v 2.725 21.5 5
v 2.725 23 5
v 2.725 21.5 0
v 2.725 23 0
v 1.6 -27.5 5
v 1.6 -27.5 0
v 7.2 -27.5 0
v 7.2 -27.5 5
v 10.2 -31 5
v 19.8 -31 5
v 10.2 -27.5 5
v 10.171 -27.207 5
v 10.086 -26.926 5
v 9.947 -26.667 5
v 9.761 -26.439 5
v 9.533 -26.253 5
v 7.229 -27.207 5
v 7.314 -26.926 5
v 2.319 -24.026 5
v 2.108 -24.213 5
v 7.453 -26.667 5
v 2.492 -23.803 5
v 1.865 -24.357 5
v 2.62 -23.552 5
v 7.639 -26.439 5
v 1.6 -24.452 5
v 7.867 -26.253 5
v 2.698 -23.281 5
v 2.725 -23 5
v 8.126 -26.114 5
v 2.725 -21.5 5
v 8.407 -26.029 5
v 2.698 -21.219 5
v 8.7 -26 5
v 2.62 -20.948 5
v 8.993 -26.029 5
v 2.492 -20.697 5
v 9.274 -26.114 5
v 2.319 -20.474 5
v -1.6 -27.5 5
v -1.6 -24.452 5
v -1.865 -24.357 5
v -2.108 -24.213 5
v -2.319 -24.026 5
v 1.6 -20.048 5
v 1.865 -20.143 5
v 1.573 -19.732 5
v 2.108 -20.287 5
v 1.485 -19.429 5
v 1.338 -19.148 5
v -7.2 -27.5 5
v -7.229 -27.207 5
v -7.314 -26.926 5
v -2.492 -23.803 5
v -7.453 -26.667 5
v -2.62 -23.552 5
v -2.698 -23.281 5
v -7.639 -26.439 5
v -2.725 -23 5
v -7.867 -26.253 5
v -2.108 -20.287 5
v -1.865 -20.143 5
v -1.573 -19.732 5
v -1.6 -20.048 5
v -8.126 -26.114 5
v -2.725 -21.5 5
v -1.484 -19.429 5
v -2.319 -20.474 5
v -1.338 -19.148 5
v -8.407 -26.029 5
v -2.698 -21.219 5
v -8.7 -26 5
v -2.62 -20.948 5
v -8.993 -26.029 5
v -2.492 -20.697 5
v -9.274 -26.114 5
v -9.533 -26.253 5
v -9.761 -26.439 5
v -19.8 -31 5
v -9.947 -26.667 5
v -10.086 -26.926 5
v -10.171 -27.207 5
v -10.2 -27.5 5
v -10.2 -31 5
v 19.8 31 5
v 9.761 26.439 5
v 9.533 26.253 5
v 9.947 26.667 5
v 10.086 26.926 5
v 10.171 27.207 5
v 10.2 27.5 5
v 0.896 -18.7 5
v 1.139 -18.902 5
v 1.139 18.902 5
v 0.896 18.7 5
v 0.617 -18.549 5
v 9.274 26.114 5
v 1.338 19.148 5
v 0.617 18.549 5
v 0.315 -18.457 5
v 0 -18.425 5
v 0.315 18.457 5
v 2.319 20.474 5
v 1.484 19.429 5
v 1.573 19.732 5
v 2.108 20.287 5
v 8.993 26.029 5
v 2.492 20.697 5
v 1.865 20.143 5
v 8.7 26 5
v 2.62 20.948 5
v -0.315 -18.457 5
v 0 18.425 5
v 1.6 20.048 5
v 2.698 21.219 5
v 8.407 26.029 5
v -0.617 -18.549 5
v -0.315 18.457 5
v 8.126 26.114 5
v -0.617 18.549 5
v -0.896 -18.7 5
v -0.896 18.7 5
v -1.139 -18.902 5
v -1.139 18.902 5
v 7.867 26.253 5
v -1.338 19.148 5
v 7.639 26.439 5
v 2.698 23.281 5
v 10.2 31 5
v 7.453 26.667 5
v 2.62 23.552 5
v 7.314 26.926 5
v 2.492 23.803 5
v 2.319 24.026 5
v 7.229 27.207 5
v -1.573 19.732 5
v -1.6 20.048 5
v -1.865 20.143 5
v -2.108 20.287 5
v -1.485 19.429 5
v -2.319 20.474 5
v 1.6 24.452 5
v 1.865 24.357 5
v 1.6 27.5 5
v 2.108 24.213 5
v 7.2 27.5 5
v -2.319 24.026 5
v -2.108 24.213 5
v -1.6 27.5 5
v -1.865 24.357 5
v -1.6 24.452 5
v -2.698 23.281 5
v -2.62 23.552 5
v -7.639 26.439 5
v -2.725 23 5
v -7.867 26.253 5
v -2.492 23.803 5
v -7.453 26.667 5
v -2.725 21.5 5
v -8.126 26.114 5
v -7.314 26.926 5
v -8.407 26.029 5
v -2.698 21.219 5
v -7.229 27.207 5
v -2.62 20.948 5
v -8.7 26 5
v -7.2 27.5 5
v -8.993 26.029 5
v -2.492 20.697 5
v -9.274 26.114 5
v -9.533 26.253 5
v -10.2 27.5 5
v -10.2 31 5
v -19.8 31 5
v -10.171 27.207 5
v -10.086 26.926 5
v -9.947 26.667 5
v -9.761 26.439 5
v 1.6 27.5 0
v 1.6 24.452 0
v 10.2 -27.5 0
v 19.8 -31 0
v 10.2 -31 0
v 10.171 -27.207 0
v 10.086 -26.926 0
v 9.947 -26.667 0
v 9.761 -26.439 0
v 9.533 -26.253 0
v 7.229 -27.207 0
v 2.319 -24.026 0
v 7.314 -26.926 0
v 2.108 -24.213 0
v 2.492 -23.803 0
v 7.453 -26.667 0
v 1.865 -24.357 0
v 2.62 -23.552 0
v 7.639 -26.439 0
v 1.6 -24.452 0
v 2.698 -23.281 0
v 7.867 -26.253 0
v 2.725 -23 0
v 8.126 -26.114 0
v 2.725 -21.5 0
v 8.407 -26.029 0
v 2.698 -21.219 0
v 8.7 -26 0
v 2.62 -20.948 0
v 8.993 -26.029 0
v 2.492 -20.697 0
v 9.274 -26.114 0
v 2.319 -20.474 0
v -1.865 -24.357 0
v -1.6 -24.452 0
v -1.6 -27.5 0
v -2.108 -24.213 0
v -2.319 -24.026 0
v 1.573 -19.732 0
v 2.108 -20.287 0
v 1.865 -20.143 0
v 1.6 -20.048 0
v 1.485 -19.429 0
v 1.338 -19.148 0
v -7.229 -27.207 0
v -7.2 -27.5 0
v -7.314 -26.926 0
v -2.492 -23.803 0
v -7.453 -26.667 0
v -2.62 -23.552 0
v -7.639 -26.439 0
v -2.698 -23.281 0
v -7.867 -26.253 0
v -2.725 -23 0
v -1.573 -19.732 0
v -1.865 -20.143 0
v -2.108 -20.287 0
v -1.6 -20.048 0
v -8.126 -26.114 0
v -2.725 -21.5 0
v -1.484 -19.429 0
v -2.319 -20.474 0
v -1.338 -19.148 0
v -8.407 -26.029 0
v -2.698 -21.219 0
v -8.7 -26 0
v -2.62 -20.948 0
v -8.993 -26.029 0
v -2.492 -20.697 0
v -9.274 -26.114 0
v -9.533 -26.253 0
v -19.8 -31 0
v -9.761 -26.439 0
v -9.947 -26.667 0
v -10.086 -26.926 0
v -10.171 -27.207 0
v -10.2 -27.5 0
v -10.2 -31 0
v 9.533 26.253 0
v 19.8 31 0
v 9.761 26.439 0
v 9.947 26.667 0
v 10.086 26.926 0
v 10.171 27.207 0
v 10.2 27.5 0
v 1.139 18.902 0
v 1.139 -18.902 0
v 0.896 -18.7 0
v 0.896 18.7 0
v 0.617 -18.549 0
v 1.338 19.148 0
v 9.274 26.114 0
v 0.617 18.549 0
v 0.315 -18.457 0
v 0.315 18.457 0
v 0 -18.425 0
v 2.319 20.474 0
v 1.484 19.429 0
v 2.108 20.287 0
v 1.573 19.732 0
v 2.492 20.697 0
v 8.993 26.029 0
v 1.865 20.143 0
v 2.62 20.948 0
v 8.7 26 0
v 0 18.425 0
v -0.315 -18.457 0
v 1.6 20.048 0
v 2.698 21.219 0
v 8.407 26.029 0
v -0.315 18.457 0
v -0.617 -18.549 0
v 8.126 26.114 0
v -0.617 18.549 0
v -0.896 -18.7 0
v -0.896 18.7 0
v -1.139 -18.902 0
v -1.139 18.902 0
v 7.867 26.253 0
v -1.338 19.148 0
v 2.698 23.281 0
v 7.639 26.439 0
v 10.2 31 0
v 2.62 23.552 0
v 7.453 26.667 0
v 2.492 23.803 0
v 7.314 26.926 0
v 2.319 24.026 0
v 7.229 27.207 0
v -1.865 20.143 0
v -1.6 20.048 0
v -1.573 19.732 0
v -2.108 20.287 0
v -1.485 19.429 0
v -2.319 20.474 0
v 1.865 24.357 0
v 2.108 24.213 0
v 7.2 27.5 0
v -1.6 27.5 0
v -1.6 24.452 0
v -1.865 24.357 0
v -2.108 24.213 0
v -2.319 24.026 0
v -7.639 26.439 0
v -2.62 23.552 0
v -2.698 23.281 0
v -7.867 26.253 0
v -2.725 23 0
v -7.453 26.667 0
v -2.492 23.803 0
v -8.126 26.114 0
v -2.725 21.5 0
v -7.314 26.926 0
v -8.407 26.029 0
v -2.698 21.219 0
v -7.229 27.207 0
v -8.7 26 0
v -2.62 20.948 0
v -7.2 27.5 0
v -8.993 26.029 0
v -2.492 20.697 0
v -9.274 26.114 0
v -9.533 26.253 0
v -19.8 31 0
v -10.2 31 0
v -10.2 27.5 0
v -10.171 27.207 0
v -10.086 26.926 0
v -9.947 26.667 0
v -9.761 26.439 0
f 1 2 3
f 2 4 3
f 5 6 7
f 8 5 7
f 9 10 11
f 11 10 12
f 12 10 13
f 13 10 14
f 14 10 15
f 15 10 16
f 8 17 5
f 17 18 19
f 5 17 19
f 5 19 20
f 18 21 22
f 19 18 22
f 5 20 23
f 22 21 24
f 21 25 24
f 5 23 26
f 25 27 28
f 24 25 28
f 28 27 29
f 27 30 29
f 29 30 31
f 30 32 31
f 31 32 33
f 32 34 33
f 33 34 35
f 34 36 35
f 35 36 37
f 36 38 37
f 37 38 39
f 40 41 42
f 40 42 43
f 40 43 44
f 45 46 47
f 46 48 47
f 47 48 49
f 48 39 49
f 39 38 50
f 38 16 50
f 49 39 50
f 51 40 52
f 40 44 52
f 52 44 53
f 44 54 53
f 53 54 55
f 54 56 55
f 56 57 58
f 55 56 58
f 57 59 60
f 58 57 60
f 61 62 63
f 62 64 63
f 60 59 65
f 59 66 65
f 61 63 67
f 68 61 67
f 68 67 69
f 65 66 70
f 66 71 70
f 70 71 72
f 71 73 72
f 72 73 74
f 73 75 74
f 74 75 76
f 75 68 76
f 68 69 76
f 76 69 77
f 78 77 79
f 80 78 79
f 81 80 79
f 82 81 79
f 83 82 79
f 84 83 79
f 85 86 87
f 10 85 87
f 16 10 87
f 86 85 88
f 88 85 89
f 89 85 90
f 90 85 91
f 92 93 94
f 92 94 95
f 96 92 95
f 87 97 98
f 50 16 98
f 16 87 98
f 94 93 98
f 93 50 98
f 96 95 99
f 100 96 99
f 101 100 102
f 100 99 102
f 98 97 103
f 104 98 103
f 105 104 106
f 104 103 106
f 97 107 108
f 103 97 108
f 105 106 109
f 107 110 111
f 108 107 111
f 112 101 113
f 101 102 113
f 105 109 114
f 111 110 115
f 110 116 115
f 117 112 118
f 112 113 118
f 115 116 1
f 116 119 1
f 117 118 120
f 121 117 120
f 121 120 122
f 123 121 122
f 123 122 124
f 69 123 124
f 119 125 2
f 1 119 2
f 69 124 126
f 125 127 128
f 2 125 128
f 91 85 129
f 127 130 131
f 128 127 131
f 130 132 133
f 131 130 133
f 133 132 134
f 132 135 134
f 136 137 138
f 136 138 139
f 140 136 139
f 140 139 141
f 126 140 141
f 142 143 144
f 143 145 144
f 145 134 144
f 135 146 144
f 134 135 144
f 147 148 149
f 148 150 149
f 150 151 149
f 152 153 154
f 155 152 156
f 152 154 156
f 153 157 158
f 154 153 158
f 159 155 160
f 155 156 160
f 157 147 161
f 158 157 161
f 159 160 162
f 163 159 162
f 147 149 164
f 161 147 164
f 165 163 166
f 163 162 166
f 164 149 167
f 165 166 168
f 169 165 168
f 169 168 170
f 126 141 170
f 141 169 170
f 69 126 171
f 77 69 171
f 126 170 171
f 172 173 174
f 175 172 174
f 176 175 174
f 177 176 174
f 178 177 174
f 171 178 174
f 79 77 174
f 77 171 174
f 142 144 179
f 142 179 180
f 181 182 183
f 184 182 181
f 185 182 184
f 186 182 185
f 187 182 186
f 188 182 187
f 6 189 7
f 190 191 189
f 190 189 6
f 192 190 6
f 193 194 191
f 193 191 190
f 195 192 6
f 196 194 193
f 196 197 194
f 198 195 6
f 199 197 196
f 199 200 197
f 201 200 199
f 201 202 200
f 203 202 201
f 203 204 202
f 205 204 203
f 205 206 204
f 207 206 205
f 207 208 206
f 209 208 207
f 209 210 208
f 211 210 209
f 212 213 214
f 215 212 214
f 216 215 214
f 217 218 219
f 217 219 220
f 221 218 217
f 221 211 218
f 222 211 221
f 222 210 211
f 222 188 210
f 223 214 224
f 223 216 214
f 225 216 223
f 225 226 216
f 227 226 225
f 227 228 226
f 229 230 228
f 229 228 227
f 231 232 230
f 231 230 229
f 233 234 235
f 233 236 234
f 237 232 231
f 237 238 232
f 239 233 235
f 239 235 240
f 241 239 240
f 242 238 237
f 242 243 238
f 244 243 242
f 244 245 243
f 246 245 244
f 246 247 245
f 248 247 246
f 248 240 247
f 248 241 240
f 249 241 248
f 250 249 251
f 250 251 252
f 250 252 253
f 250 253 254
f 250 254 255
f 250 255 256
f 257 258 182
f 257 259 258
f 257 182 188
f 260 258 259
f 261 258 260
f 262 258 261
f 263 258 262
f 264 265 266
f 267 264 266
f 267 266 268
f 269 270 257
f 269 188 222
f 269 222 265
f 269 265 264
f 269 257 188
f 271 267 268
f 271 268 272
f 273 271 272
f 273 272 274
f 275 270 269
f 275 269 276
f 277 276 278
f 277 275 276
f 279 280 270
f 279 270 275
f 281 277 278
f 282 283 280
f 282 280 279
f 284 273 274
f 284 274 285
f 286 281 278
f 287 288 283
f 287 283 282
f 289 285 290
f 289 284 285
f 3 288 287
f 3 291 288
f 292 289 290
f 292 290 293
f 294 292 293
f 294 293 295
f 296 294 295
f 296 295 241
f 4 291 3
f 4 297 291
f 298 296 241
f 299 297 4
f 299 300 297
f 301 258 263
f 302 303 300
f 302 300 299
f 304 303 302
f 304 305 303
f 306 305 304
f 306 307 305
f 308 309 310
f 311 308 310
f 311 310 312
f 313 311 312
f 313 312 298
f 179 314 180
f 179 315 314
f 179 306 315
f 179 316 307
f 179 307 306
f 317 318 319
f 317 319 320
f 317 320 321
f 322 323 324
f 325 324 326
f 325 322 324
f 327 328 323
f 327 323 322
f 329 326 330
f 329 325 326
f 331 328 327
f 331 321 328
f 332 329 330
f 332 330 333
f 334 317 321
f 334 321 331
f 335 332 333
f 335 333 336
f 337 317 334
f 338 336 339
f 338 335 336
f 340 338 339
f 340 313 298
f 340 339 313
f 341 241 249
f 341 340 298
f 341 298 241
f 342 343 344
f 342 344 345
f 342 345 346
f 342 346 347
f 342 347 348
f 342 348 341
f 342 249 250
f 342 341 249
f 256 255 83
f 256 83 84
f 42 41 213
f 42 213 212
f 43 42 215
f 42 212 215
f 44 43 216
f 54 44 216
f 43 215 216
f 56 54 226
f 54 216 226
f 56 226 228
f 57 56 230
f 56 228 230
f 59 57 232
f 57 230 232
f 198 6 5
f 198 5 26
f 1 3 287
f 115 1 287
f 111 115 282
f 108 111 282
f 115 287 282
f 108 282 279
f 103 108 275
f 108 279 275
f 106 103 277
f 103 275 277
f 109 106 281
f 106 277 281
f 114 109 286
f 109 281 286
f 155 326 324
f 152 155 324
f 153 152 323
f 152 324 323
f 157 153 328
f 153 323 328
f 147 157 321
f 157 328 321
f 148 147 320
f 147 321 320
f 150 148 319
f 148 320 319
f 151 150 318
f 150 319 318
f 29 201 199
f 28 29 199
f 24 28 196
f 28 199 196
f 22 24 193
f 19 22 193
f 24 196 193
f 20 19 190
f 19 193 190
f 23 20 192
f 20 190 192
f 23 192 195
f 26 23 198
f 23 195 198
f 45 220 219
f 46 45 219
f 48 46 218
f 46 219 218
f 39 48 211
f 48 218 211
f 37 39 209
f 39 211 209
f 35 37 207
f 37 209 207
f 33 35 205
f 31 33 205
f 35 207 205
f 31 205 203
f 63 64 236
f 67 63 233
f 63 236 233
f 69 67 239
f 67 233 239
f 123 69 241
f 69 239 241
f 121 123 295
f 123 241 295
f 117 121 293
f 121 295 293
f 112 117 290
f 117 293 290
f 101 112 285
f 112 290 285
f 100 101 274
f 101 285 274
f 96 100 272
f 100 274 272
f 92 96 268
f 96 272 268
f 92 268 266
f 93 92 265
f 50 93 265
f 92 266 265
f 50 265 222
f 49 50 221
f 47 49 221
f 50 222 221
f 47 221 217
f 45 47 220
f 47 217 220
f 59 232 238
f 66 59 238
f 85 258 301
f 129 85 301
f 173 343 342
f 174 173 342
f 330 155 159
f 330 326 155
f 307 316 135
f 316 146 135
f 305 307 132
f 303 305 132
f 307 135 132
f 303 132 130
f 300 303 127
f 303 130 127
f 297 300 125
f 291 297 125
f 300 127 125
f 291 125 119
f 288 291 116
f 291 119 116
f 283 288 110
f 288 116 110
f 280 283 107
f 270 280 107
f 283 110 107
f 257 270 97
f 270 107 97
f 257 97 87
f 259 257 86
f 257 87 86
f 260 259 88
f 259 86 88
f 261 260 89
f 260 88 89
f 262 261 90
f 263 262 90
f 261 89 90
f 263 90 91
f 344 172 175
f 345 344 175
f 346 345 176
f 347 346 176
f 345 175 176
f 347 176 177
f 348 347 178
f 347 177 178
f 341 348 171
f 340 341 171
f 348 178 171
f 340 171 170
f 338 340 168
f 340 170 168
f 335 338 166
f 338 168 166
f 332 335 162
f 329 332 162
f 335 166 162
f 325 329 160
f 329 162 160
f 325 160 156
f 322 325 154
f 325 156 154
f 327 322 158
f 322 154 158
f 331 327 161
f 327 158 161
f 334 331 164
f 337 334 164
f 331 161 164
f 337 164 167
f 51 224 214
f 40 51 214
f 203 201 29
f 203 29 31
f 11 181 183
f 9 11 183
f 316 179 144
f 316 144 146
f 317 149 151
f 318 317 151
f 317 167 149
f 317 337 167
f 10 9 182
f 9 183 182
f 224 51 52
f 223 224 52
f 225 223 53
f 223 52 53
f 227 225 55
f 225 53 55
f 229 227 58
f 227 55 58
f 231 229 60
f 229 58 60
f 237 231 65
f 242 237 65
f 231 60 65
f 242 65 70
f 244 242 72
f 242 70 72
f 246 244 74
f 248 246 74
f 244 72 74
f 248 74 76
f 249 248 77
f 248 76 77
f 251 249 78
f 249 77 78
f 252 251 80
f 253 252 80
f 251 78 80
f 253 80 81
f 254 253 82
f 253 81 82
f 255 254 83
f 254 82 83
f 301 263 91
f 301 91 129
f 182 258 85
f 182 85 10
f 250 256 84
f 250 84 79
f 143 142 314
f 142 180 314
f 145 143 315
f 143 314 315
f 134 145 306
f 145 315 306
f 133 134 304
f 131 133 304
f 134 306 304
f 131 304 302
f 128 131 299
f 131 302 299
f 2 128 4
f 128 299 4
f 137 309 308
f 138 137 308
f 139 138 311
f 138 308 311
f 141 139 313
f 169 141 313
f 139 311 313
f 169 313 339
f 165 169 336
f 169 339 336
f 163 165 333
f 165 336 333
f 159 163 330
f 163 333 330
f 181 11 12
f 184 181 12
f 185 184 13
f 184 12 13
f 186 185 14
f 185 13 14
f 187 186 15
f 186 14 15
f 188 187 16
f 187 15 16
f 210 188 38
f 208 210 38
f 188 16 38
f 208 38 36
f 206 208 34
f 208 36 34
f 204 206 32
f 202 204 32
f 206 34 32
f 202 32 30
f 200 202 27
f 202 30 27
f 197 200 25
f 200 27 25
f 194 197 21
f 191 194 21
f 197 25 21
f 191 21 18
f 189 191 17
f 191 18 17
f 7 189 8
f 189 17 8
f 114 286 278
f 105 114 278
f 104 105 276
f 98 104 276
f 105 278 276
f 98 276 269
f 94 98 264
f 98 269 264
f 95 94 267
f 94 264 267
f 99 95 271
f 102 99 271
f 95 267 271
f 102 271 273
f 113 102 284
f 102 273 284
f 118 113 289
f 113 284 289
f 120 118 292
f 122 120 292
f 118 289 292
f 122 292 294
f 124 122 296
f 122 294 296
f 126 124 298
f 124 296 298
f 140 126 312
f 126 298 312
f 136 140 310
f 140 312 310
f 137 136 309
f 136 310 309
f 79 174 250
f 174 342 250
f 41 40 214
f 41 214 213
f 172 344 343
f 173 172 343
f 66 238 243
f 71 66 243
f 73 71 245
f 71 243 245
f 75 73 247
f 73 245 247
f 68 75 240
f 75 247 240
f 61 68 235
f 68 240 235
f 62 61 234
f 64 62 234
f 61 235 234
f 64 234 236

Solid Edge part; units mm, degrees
sketch "Sketch1" plane through (0, 0, 0) normal (0, 0, 1) x (1, 0, 0)
  line L0 (-10.2, 27.5) -> (10.2, 27.5)
  line L1 (10.2, 27.5) -> (10.2, 31)
  line L2 (19.8, 31) -> (10.2, 31)
  line L3 (19.8, 31) -> (19.8, -31)
  line L4 (10.2, -31) -> (19.8, -31)
  line L5 (10.2, -27.5) -> (10.2, -31)
  line L6 (-10.2, -27.5) -> (10.2, -27.5)
  line L7 (-10.2, -27.5) -> (-10.2, -31)
  line L8 (-10.2, -31) -> (-19.8, -31)
  line L9 (-19.8, 31) -> (-19.8, -31)
  line L10 (-10.2, 31) -> (-19.8, 31)
  line L11 (-10.2, 27.5) -> (-10.2, 31)
extrude "Protrusion1" add sketch "Sketch1" along normal blind 5
sketch "Sketch2" plane through (0, 0, 5) normal (0, 0, 1) x (1, 0, 0)
  circle A0 centre (8.7, 27.5) radius 1.5
  circle A1 centre (-8.7, 27.5) radius 1.5
  circle A2 centre (8.7, -27.5) radius 1.5
  circle A3 centre (-8.7, -27.5) radius 1.5
extrude "ExtrudedCutout_4" cut sketch "Sketch2" against normal blind 5
sketch "Sketch3" plane through (0, 0, 0) normal (0, 0, -1) x (0, 1, 0)
  line L0 (-27.5, -1.5998) -> (-24.4524, -1.5998)
  arc A0 (-24.4524, -1.5998) -> (-23, -2.725) centre (-23, -1.225) ccw
  line L1 (-23, -2.725) -> (-21.5, -2.725)
  arc A1 (-21.5, -2.725) -> (-20.0476, -1.5998) centre (-21.5, -1.225) ccw
  arc A2 (-20.0476, 1.5998) -> (-20.0476, -1.5998) centre (-20.0254, 0) cw
  arc A3 (-21.5, 2.725) -> (-20.0476, 1.5998) centre (-21.5, 1.225) cw
  line L2 (-23, 2.725) -> (-21.5, 2.725)
  arc A4 (-24.4524, 1.6) -> (-23, 2.725) centre (-23, 1.225) cw
  line L3 (-27.5, 1.6) -> (-24.4524, 1.6)
  line L4 (-27.5, 0) -> (-27.5, 1.6)
  line L5 (-27.5, 0) -> (-27.5, -1.5998)
  arc A5 (21.5, 2.725) -> (20.0476, 1.5998) centre (21.5, 1.225) ccw
  arc A6 (20.0476, 1.5998) -> (20.0476, -1.5998) centre (20.0254, 0) ccw
  arc A7 (21.5, -2.725) -> (20.0476, -1.5998) centre (21.5, -1.225) cw
  line L6 (23, -2.725) -> (21.5, -2.725)
  arc A8 (24.4524, -1.5998) -> (23, -2.725) centre (23, -1.225) cw
  line L7 (27.5, -1.5998) -> (24.4524, -1.5998)
  line L8 (27.5, 0) -> (27.5, -1.5998)
  line L9 (27.5, 0) -> (27.5, 1.6)
  line L10 (27.5, 1.6) -> (24.4524, 1.6)
  arc A9 (24.4524, 1.6) -> (23, 2.725) centre (23, 1.225) ccw
  line L11 (23, 2.725) -> (21.5, 2.725)
extrude "Cutout1" cut sketch "Sketch3" against normal up to next
properties material "Polycarbonate"
